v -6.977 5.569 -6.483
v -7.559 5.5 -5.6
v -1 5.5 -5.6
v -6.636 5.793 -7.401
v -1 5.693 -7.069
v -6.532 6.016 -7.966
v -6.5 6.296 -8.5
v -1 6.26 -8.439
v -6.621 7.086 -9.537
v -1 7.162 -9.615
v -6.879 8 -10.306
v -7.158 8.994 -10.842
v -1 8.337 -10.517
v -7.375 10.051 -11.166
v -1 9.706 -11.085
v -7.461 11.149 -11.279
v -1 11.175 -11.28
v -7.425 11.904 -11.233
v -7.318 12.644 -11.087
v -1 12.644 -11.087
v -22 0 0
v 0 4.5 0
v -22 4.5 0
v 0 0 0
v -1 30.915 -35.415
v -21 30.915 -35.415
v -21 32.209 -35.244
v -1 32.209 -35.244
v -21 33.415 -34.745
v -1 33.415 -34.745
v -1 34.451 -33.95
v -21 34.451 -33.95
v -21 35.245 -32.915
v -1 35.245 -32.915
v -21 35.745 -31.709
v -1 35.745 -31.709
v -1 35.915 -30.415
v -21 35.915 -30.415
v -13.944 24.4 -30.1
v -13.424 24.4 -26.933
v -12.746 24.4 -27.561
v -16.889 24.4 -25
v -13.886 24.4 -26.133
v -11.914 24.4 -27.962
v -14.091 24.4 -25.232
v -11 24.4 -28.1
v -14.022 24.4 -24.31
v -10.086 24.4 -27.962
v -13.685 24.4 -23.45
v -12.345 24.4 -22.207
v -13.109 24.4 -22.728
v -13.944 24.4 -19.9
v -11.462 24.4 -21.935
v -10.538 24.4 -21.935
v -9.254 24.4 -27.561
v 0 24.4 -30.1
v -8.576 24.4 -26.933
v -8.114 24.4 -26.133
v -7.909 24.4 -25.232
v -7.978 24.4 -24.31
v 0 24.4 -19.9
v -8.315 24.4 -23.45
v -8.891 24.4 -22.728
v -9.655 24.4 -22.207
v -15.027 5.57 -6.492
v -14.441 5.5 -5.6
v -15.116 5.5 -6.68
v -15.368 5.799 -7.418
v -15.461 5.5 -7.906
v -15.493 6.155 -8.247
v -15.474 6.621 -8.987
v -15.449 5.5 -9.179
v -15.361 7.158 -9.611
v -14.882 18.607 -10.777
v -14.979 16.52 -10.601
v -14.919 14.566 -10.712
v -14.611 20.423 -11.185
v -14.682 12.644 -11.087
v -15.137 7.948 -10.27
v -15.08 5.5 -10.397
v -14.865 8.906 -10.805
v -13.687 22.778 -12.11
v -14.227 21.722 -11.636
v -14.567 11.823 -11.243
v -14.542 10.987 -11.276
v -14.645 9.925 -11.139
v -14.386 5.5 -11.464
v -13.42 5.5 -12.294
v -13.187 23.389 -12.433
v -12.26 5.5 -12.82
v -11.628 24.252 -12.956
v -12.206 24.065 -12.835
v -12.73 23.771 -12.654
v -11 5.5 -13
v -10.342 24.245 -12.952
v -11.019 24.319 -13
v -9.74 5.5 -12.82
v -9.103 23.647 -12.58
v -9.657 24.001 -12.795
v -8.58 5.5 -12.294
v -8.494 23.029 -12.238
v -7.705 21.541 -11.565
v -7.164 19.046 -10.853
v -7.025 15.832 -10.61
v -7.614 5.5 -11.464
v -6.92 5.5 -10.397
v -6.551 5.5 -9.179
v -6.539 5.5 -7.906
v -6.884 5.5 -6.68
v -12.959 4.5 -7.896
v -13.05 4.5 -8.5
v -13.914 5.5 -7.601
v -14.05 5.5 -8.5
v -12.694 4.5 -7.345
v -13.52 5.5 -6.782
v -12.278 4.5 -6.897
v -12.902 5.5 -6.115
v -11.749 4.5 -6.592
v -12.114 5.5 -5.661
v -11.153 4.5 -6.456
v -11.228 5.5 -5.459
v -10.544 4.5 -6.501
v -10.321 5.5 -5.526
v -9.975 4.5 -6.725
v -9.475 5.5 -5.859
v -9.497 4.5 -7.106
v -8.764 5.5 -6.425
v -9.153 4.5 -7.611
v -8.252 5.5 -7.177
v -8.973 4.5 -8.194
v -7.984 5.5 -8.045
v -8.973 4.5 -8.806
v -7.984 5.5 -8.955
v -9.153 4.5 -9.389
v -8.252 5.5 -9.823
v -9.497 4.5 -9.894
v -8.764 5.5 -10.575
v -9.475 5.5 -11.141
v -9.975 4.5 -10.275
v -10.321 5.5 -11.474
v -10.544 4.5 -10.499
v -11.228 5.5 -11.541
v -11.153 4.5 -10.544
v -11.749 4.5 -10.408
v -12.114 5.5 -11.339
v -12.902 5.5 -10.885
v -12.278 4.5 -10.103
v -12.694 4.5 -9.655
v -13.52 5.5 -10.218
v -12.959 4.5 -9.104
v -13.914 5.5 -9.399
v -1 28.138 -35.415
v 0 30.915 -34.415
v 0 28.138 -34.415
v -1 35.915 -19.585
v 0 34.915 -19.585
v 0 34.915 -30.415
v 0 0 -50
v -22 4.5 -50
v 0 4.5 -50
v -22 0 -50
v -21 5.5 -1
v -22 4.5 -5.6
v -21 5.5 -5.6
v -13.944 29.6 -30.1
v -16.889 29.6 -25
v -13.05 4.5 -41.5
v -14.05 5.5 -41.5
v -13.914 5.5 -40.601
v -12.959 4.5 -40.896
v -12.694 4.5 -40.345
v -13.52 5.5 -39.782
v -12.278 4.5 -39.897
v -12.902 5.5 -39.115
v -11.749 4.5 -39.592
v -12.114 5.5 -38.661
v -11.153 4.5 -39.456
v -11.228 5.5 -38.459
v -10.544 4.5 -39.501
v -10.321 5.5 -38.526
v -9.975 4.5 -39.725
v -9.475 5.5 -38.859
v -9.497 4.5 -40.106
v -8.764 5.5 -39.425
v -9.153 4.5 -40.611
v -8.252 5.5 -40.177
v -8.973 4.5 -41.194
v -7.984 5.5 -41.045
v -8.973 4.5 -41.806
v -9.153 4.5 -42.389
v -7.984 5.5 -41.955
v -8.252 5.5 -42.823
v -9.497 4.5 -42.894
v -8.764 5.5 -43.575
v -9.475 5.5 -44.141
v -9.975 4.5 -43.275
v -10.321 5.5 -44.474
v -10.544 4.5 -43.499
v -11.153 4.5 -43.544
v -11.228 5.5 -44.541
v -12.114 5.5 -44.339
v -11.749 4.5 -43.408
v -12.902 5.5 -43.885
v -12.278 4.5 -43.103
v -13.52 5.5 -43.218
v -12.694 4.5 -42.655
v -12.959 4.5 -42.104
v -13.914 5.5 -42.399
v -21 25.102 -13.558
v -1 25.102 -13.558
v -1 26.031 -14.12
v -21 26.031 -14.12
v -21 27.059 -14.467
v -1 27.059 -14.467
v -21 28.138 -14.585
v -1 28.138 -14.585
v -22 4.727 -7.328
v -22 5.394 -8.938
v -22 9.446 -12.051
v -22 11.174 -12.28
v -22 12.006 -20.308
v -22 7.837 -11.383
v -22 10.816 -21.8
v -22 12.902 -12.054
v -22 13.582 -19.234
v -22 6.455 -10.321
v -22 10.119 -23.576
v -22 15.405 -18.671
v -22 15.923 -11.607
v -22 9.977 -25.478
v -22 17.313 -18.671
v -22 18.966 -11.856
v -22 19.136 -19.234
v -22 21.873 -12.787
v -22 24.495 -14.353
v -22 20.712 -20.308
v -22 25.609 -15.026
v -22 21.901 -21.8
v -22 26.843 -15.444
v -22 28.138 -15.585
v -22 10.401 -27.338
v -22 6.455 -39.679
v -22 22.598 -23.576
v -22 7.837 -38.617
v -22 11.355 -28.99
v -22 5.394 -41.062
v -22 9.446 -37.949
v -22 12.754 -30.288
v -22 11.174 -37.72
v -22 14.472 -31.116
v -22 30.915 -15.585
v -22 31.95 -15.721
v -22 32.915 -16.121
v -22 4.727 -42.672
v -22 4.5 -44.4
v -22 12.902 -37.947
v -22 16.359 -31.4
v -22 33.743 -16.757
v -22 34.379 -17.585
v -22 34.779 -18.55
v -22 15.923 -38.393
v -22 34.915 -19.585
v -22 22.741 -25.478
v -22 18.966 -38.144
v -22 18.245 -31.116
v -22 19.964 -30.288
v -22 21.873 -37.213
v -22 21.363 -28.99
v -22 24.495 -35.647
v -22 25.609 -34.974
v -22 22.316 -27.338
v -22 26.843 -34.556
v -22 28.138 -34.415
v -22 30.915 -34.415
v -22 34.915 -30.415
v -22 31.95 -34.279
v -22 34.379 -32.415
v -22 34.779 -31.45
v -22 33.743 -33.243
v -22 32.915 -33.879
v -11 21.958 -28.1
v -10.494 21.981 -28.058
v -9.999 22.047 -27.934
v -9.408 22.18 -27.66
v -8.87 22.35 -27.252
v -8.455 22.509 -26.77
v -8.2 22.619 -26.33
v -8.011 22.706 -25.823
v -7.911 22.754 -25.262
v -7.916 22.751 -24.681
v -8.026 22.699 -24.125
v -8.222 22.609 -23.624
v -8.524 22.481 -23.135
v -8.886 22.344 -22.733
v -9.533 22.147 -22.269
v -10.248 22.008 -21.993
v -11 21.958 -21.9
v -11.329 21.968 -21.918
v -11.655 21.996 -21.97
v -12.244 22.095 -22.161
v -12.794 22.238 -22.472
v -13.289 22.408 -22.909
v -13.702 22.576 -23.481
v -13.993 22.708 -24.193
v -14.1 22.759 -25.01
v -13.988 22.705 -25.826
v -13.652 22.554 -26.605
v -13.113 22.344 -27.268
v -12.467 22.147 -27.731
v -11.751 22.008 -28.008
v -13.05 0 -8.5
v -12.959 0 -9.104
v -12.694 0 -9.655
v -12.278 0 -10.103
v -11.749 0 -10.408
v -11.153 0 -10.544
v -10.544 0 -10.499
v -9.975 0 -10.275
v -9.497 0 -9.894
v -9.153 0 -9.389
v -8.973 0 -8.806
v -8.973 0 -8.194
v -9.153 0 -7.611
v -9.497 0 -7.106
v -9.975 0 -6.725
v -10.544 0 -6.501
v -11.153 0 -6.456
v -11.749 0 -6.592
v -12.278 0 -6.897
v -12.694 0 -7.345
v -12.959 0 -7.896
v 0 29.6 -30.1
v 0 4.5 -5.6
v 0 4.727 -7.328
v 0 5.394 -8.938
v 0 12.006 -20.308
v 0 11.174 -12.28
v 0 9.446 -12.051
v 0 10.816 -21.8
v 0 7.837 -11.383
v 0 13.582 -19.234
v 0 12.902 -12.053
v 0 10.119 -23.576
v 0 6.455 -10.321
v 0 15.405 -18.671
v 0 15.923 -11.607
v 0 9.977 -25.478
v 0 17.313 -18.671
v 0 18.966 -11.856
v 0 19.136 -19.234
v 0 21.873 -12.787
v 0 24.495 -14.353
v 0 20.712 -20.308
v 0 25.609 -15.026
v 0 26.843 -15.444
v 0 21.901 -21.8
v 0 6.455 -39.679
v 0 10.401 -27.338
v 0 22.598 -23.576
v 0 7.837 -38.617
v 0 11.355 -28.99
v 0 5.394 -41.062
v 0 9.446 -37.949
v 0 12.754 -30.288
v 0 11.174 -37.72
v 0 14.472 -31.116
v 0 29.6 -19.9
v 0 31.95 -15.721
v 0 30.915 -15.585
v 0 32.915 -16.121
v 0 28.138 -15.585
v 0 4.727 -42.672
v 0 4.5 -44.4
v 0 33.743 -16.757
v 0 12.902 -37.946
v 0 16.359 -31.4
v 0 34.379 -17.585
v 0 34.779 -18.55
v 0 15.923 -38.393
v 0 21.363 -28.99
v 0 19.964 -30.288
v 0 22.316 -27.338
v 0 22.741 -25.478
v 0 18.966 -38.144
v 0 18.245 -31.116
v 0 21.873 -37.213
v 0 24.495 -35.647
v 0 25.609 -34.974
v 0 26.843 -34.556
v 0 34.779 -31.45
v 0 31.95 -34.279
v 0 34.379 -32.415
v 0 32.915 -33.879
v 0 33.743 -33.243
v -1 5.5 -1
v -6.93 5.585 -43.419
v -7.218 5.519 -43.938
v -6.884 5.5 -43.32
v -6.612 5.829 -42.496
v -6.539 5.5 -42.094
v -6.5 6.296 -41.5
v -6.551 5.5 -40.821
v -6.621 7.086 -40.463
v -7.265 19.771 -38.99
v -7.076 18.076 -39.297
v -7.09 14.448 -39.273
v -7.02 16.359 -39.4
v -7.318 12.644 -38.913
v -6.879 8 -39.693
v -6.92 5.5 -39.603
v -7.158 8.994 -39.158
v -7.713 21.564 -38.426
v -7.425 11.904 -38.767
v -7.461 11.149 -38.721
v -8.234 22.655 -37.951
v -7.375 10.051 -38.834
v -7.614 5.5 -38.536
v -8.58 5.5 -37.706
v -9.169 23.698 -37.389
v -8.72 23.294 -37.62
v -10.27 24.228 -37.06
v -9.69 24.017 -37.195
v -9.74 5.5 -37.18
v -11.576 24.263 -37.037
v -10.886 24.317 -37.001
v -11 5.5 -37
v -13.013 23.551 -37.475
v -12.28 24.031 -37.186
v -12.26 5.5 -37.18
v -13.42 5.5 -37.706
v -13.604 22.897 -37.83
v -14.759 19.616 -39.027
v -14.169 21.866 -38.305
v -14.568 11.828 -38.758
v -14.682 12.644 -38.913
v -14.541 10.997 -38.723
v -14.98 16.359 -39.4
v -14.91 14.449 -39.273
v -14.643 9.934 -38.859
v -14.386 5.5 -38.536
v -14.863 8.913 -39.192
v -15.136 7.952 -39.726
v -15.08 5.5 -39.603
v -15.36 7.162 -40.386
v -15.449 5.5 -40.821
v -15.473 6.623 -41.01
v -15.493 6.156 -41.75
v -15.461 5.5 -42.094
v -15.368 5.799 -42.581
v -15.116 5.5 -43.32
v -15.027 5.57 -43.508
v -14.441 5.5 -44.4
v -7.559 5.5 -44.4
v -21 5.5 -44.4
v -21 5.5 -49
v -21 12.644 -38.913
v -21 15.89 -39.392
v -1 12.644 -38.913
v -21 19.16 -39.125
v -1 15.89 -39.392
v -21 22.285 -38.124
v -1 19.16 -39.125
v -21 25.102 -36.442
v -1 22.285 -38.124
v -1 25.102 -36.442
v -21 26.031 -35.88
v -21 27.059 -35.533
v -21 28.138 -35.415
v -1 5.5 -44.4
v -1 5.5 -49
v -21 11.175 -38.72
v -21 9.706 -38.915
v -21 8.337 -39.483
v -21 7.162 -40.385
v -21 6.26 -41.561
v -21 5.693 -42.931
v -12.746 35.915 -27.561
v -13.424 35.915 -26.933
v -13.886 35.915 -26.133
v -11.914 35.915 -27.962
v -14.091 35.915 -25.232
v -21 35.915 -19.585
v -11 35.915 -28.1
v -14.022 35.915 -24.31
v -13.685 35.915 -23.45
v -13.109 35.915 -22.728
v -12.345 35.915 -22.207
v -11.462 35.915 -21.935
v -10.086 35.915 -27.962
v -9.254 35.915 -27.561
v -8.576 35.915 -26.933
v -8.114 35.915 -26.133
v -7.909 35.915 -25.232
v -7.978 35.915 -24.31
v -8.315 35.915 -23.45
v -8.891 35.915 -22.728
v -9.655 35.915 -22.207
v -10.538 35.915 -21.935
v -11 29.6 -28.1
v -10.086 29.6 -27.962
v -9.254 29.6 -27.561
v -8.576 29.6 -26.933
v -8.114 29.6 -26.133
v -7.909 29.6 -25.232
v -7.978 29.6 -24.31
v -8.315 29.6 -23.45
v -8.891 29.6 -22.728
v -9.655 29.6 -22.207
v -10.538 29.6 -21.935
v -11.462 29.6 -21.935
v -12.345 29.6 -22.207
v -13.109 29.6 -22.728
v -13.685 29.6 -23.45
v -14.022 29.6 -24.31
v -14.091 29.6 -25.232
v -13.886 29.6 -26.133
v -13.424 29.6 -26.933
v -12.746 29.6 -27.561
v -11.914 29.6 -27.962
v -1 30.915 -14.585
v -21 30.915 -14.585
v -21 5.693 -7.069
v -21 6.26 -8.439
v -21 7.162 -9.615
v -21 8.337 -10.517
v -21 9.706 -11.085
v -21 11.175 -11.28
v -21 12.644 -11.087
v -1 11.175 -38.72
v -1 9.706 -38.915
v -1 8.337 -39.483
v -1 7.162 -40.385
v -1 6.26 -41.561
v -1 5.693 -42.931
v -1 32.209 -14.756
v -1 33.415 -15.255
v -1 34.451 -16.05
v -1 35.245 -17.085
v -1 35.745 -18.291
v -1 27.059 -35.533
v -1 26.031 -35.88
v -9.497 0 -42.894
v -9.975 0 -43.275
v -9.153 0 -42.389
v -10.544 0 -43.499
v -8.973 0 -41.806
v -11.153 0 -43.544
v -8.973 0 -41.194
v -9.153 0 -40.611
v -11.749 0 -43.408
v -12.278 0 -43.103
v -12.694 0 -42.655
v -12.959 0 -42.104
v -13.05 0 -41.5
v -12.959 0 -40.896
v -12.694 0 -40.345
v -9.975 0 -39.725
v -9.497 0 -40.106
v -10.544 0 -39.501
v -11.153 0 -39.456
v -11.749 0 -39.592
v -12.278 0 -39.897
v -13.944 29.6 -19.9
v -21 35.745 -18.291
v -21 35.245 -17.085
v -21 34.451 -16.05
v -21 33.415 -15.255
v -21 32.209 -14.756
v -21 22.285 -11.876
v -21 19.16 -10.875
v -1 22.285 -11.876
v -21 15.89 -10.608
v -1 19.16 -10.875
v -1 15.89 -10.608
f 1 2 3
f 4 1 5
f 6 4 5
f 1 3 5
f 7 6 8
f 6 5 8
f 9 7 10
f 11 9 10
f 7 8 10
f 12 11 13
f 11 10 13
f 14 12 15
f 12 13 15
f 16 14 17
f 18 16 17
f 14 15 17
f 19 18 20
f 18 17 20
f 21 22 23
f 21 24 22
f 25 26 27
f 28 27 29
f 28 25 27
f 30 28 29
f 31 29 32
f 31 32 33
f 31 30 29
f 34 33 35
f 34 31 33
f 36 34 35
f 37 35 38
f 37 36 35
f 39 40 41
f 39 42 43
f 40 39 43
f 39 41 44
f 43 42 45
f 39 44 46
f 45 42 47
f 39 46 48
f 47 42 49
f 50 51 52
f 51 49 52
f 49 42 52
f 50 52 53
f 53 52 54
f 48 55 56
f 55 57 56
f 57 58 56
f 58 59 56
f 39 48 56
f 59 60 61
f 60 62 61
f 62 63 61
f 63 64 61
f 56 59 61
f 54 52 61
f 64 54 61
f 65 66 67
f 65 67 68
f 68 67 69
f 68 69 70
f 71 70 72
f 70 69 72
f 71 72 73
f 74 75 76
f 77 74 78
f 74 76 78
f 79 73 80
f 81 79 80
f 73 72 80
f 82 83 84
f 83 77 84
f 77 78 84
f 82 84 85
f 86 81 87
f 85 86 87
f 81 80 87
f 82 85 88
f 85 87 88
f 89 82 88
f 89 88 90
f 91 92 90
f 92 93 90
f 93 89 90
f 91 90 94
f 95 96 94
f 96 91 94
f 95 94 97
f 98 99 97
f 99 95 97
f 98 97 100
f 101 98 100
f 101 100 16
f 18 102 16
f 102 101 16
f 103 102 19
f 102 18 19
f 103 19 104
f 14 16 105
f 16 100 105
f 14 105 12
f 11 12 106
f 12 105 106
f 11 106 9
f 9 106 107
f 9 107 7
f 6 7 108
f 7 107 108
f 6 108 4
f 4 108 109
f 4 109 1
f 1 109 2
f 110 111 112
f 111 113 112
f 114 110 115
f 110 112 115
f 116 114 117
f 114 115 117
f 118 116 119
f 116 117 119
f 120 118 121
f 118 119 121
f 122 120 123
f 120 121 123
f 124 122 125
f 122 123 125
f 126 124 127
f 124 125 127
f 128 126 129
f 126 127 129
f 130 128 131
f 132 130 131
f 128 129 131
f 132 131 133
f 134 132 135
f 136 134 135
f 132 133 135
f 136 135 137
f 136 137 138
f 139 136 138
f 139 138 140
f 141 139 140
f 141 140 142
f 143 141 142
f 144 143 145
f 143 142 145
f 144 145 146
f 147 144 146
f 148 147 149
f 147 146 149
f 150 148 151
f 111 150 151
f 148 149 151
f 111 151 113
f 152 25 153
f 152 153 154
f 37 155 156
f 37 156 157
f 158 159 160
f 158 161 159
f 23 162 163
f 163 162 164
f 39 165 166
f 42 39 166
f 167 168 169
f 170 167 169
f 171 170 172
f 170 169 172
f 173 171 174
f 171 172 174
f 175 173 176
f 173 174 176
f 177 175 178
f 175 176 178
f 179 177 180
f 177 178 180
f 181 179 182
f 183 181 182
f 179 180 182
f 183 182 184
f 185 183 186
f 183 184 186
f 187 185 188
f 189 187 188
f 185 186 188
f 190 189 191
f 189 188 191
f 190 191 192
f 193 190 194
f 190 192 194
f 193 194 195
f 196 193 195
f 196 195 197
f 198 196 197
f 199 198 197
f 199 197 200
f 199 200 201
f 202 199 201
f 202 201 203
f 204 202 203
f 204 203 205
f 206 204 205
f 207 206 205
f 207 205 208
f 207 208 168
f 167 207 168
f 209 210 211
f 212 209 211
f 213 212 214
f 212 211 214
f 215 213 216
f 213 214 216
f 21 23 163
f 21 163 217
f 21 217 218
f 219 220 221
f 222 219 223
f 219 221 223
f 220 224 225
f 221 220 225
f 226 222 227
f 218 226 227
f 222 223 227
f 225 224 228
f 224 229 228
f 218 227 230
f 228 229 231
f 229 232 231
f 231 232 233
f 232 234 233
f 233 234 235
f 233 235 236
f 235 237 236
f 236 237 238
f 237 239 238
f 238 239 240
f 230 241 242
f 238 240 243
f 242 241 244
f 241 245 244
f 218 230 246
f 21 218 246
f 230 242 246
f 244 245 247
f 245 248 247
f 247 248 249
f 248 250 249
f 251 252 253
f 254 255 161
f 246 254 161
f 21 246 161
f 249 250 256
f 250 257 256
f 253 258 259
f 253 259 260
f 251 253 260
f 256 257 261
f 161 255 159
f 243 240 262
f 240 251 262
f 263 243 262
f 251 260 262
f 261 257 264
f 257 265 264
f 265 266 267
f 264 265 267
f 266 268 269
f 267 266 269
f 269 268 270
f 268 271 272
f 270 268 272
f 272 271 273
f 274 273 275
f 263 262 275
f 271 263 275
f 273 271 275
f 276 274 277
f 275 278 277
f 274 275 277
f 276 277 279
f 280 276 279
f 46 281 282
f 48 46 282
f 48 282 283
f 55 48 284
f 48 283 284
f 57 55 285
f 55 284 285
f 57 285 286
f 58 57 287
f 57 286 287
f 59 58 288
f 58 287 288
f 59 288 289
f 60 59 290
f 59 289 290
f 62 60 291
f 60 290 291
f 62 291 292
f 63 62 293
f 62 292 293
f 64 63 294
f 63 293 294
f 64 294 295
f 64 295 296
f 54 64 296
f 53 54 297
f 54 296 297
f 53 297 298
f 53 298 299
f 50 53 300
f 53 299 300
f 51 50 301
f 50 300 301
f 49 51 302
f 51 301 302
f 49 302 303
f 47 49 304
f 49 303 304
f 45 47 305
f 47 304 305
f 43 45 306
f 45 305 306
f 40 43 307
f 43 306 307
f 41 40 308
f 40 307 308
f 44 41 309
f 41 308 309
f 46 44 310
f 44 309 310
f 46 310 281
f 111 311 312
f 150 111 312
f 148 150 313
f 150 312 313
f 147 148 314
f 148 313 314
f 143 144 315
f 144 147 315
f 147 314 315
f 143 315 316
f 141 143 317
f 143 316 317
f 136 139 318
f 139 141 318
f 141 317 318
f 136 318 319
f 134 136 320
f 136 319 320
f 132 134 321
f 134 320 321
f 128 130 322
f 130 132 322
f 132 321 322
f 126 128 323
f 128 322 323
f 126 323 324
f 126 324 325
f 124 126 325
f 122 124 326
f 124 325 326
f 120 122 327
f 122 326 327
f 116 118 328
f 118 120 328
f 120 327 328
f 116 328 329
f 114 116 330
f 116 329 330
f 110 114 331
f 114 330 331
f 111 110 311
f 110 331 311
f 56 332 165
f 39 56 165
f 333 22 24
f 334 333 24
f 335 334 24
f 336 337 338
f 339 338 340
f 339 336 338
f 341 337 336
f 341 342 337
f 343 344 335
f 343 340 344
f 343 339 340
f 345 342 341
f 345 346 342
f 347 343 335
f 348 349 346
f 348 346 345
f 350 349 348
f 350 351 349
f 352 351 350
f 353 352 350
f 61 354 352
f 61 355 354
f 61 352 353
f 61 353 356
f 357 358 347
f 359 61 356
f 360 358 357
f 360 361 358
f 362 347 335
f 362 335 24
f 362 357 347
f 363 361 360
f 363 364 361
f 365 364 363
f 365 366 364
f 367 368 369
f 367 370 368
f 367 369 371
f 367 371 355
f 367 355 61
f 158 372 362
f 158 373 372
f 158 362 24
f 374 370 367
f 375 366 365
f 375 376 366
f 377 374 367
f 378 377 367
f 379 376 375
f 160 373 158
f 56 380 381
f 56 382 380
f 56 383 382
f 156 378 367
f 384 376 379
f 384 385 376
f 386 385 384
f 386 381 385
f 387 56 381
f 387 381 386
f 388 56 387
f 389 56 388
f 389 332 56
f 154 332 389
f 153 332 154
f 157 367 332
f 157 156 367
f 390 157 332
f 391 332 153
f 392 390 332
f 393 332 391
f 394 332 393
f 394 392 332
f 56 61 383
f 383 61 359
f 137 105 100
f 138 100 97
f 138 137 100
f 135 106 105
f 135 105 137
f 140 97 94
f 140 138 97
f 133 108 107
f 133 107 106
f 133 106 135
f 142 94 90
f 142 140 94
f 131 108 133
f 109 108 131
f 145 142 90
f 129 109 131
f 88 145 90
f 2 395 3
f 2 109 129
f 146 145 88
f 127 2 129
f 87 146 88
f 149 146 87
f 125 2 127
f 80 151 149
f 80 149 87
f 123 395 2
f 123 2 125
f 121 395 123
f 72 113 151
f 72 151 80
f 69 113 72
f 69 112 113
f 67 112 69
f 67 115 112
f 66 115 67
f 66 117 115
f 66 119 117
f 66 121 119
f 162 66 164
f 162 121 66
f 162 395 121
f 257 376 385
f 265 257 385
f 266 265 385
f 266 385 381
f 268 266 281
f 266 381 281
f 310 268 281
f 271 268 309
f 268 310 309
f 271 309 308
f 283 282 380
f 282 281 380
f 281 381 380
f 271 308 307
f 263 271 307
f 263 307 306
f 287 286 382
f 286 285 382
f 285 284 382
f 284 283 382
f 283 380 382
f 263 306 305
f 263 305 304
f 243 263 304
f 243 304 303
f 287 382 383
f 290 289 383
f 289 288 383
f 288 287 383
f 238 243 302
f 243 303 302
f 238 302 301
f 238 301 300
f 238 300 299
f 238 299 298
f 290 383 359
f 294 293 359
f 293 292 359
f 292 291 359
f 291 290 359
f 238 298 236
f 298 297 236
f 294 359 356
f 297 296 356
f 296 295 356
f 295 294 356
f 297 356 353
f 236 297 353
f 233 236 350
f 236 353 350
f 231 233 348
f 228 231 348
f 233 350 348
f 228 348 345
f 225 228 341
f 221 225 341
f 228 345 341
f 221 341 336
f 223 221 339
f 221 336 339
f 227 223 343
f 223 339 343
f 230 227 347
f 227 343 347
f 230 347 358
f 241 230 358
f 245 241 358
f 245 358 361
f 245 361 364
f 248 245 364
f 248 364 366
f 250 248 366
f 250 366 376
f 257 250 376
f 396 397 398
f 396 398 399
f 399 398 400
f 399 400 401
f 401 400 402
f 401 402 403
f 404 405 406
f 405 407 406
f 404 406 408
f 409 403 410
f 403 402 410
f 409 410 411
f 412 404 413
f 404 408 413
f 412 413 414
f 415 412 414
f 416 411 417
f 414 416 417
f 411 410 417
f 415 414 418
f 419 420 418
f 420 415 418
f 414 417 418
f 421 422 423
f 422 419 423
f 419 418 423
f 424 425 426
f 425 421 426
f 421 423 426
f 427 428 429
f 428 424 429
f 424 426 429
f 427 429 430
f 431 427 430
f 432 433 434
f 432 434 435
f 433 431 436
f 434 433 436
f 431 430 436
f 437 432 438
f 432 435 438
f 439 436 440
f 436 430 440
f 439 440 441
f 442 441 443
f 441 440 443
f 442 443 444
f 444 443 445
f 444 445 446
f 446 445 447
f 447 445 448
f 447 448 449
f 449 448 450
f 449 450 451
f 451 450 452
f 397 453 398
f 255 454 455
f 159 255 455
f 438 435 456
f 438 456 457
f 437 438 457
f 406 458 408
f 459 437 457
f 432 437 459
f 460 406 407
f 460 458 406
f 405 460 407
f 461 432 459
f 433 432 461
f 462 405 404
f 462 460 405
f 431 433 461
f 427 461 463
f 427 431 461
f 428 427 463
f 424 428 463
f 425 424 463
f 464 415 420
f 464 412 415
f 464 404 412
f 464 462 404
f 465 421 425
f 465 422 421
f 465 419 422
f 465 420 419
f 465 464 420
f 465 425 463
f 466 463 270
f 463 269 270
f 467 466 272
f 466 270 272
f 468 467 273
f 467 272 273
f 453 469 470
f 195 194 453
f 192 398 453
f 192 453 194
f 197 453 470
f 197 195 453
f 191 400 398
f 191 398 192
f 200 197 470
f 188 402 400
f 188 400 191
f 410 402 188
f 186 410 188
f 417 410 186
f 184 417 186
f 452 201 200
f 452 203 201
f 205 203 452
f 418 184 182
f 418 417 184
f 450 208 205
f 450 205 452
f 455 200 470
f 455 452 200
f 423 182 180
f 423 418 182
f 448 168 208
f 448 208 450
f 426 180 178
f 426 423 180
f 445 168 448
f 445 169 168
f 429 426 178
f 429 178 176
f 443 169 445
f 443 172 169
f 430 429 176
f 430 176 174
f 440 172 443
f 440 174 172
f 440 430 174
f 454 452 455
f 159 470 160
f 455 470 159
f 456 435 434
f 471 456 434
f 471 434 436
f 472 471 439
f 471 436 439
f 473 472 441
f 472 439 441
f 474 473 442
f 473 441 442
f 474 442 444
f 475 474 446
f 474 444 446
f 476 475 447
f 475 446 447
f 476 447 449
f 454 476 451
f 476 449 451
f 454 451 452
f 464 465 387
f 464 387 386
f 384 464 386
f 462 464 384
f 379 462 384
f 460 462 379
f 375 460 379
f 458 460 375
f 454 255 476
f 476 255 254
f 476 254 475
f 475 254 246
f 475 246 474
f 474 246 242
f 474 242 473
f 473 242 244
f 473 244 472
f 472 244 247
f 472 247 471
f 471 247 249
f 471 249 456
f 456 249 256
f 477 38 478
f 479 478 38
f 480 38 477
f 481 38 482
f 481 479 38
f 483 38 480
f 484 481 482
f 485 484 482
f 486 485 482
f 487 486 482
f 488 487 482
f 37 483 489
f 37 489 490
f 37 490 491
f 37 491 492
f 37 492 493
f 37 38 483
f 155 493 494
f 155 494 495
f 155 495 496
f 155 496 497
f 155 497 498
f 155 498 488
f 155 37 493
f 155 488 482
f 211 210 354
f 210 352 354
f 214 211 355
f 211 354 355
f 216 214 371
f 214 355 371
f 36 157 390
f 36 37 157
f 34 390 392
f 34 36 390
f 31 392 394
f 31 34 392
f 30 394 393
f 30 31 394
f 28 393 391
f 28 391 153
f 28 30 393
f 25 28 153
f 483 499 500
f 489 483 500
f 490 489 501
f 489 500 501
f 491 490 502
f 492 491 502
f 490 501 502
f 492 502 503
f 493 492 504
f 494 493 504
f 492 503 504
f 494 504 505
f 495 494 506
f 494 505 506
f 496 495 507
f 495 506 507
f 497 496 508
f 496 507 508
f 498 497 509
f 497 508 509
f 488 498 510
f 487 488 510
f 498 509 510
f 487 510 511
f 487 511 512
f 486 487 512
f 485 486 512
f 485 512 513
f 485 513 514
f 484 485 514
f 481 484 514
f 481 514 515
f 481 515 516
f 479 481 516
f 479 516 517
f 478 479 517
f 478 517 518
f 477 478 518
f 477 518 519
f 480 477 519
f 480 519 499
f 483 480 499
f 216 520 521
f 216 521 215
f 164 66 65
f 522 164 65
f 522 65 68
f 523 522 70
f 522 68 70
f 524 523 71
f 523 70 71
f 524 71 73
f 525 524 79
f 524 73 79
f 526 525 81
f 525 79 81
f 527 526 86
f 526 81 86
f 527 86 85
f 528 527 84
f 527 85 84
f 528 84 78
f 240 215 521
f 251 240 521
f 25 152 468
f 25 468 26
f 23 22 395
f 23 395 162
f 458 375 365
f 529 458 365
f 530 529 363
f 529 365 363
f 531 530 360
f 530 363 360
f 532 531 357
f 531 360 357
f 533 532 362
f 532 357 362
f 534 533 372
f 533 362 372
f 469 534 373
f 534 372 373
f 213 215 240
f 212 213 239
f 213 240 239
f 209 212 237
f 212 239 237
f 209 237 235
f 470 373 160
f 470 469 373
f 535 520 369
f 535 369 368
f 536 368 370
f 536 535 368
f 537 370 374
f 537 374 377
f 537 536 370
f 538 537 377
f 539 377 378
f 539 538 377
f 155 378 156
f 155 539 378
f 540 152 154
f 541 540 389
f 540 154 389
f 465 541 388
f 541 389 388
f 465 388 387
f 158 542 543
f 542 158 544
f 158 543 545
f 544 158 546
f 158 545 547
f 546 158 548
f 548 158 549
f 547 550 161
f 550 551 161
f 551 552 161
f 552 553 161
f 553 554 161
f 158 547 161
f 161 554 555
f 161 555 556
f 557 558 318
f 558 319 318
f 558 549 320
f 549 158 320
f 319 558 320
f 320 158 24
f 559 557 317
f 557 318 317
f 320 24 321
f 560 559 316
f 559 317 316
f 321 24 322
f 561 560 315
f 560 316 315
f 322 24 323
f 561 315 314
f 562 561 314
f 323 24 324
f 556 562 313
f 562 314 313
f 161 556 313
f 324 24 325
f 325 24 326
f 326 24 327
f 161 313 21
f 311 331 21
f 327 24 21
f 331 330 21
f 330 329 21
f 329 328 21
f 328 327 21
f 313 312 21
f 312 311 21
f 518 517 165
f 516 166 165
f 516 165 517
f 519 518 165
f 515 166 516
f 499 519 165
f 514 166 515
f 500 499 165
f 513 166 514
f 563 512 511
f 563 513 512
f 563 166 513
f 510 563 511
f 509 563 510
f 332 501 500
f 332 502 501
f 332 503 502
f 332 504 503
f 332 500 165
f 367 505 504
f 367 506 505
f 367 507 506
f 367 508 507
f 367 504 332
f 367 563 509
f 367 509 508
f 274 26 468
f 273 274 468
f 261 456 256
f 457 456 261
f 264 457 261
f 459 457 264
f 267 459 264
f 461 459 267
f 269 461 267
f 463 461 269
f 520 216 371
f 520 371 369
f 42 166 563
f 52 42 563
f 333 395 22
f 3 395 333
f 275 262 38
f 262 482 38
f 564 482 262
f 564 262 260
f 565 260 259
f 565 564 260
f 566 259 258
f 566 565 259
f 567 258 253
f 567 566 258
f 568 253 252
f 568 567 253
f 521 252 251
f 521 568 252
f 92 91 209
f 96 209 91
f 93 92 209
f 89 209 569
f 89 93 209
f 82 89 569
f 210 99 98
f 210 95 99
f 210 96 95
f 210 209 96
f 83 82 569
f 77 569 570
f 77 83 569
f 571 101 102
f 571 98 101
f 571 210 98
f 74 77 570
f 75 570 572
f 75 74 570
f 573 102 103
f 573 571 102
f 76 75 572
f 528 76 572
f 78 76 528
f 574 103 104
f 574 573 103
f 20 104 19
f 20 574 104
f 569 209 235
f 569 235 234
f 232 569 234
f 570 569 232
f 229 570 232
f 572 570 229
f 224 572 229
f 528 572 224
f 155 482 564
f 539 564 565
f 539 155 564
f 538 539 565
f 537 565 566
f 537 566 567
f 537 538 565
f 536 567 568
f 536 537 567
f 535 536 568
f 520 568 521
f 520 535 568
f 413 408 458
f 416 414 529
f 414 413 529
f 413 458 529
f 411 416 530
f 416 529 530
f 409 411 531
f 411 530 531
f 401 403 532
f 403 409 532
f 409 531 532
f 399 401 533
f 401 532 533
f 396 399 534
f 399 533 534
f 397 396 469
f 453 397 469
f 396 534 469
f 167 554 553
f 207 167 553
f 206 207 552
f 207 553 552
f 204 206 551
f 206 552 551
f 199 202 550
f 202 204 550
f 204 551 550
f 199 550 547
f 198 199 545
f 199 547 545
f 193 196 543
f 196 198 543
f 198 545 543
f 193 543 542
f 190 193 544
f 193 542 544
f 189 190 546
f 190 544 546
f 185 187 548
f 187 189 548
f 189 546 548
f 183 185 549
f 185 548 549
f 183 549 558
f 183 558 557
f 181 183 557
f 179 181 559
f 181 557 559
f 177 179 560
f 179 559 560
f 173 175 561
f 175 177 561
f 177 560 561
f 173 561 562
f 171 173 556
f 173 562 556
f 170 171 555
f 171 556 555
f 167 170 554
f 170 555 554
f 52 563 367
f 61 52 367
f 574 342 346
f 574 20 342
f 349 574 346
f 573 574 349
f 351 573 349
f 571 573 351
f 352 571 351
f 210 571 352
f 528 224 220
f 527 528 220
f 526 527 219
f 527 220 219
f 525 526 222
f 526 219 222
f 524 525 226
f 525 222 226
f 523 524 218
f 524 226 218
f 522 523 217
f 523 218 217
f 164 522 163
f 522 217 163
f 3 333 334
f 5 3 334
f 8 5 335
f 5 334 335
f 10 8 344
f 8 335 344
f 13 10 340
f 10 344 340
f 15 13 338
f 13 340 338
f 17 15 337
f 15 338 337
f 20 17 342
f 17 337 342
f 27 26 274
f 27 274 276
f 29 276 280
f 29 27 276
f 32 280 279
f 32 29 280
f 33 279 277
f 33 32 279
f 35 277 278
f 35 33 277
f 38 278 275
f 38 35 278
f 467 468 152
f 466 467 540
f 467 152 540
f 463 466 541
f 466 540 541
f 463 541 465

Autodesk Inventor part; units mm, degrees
ref_plane "YZ Plane" through (0, 0, 0) normal (1, 0, 0) x (0, 1, 0)
sketch "Sketch1" plane through (0, 0, 0) normal (0, 1, 0) x (-1, 0, 0)
  line L0 (0, 0) -> (22, 0)
  line L1 (22, 0) -> (22, -50)
  line L2 (22, -50) -> (0, -50)
  line L3 (0, -50) -> (0, 0)
  circle A0 centre (11, -8.5) radius 2.05
  circle A1 centre (11, -41.5) radius 2.05
  line L4 (22, 0) -> (0, -50) construction
  line L5 (22, -50) -> (0, 0) construction
  point P0 (11, -25)
  dimension "d0" = 22
  dimension "d1" = 50
  dimension "d2" = 4.1
  dimension "d3" = 4.1
  dimension "d5" = 33
  dimension "d40" = 16.5
extrude "Extrusion1" add sketch "Sketch1" along normal blind 5.5
sketch "Sketch3" plane through (0, 0, 0) normal (1, 0, 0) x (0, 0, -1)
  circle A0 centre (25, 16.3589) radius 6.4
  circle A1 centre (25, 16.3589) radius 14.4
  line L0 (50, 5.5) -> (0, 5.5) projected
  arc A2 (5.6002, 5.5) -> (11.0873, 12.6443) centre (5.6002, 11.1793) ccw
  arc A3 (38.9127, 12.6443) -> (44.3998, 5.5) centre (44.3998, 11.1793) ccw
  line L1 (0, 5.5) -> (50, 5.5) projected
  point P0 (0, 0)
  point P1 (25, 5.5)
  dimension "d11" = 12.8
  dimension "d12" = 8
extrude "Extrusion2" add sketch "Sketch3" against normal up to surface (22 mm away) contours A1 L0 | A1 L0 A2 | A3 L0 A1 picked at (24.7429, 7.0019)
sketch "Sketch4" plane through (0, 5.5, 0) normal (0, 1, 0) x (1, 0, 0)
  circle A0 centre (-11, 8.5) radius 2.05 construction
  circle A1 centre (-11, 8.5) radius 4.5
  circle A2 centre (-11, 41.5) radius 2.05 construction
  circle A3 centre (-11, 41.5) radius 4.5
  point P0 (0, 0)
  dimension "d15" = 9
  dimension "d16" = 9
extrude "Extrusion3" cut sketch "Sketch4" along normal through all
ref_plane "Work Plane2" through (-11, 0, 0) normal (1, 0, 0) x (0, 0, -1)
sketch "Sketch11" plane through (0, 0, 0) normal (1, 0, 0) x (0, 0, -1)
  line L0 (14.5852, 24.3188) -> (35.4148, 24.3188)
  line L1 (35.4148, 24.3188) -> (35.4148, 30.915)
  line L2 (30.4148, 35.915) -> (19.5852, 35.915)
  line L3 (14.5852, 30.915) -> (14.5852, 24.3188)
  line L4 (0, 0) -> (50, 0) projected
  arc A0 (19.5852, 35.915) -> (14.5852, 30.915) centre (19.5852, 30.915) ccw
  arc A1 (35.4148, 30.915) -> (30.4148, 35.915) centre (30.4148, 30.915) ccw
  point P0 (35.4148, 35.915)
  point P1 (14.5852, 35.915)
  point P2 (25, 24.3188)
  point P3 (25, 0)
  dimension "d49" = 5
extrude "Extrusion7" add sketch "Sketch11" against normal up to surface (22 mm away)
sketch "Sketch7" plane through (-11, 0, 0) normal (1, 0, 0) x (0, 0, -1)
  arc A0 (38.9127, 12.6443) -> (11.0873, 12.6443) centre (25, 16.3589) ccw construction
  line L0 (25, 16.3589) -> (25, 53.8517)
  line L1 (25, 40.4327) -> (28.1, 40.4327)
  line L2 (28.1, 40.4327) -> (28.1, 27.8589)
  line L3 (28.1, 27.8589) -> (28.1, 21.958)
  line L4 (28.1, 21.958) -> (25, 21.958)
  circle A1 centre (25, 16.3589) radius 6.4 projected
  point P0 (0, 0)
  point P1 (25, 22.7589)
  point P2 (28.1, 30.4212)
  point P3 (25, 30.7589)
  dimension "d28" = 6.2
revolve "Revolution1" cut sketch "Sketch7" angle 360 about axis through (-11, 16.3589, -25) along (0, 1, 0) picked at (26.7389, 22.1049) contours L0 A1 L4 | L0 L1 L2 L3 A1
ref_plane "Work Plane3" through (0, 27, 0) normal (0, -1, 0) x (1, 0, 0)
sketch "Sketch10" plane through (0, 27, 0) normal (0, -1, 0) x (1, 0, 0)
  line L0 (-16.889, -25) -> (-13.9445, -19.9)
  line L1 (-13.9445, -19.9) -> (-8.0555, -19.9)
  line L2 (-8.0555, -19.9) -> (-5.111, -25) construction
  line L3 (-5.111, -25) -> (-8.0555, -30.1) construction
  line L4 (-8.0555, -30.1) -> (-13.9445, -30.1)
  line L5 (-13.9445, -30.1) -> (-16.889, -25)
  line L6 (-8.0555, -19.9) -> (0, -19.9)
  line L7 (0, -19.9) -> (0, -30.1)
  line L8 (0, -30.1) -> (-8.0555, -30.1)
  circle A0 centre (-11, -25) radius 3.1 projected
  point P0 (0, 0)
  point P1 (-11, -21.9)
  dimension "d44" = 10.2
extrude "Extrusion6" cut sketch "Sketch10" along normal mid plane 5.2 contours L0 L1 L6 L7 L8 L4 L5 | A0
fillet "Fillet1" radius 5 2 edges at (-11, 26.3033, -35.4148) (-11, 26.3033, -14.5852)
chamfer "Chamfer1" distance 1 angle 45 22 edges at (-11, 5.5, 0) (-11, 5.5, -50) (0, 7.72, -10.1044) (0, 5.5, -2.8001) (0, 19.1603, -10.8751) (0, 19.1603, -39.1249) (0, 7.72, -39.8956) (0, 5.5, -47.1999) (-22, 19.1603, -39.1249) (-22, 7.72, -39.8956) (-22, 5.5, -47.1999) (-22, 19.1603, -10.8751) (-22, 7.72, -10.1044) (-22, 5.5, -2.8001) (-8.95, 5.5, -8.5) (-8.95, 5.5, -41.5) (0, 29.5264, -14.5852) (0, 29.5264, -35.4148) (0, 35.915, -25) (-22, 29.5264, -35.4148) (-22, 29.5264, -14.5852) (-22, 35.915, -25)
properties part number "narishige_holder"
